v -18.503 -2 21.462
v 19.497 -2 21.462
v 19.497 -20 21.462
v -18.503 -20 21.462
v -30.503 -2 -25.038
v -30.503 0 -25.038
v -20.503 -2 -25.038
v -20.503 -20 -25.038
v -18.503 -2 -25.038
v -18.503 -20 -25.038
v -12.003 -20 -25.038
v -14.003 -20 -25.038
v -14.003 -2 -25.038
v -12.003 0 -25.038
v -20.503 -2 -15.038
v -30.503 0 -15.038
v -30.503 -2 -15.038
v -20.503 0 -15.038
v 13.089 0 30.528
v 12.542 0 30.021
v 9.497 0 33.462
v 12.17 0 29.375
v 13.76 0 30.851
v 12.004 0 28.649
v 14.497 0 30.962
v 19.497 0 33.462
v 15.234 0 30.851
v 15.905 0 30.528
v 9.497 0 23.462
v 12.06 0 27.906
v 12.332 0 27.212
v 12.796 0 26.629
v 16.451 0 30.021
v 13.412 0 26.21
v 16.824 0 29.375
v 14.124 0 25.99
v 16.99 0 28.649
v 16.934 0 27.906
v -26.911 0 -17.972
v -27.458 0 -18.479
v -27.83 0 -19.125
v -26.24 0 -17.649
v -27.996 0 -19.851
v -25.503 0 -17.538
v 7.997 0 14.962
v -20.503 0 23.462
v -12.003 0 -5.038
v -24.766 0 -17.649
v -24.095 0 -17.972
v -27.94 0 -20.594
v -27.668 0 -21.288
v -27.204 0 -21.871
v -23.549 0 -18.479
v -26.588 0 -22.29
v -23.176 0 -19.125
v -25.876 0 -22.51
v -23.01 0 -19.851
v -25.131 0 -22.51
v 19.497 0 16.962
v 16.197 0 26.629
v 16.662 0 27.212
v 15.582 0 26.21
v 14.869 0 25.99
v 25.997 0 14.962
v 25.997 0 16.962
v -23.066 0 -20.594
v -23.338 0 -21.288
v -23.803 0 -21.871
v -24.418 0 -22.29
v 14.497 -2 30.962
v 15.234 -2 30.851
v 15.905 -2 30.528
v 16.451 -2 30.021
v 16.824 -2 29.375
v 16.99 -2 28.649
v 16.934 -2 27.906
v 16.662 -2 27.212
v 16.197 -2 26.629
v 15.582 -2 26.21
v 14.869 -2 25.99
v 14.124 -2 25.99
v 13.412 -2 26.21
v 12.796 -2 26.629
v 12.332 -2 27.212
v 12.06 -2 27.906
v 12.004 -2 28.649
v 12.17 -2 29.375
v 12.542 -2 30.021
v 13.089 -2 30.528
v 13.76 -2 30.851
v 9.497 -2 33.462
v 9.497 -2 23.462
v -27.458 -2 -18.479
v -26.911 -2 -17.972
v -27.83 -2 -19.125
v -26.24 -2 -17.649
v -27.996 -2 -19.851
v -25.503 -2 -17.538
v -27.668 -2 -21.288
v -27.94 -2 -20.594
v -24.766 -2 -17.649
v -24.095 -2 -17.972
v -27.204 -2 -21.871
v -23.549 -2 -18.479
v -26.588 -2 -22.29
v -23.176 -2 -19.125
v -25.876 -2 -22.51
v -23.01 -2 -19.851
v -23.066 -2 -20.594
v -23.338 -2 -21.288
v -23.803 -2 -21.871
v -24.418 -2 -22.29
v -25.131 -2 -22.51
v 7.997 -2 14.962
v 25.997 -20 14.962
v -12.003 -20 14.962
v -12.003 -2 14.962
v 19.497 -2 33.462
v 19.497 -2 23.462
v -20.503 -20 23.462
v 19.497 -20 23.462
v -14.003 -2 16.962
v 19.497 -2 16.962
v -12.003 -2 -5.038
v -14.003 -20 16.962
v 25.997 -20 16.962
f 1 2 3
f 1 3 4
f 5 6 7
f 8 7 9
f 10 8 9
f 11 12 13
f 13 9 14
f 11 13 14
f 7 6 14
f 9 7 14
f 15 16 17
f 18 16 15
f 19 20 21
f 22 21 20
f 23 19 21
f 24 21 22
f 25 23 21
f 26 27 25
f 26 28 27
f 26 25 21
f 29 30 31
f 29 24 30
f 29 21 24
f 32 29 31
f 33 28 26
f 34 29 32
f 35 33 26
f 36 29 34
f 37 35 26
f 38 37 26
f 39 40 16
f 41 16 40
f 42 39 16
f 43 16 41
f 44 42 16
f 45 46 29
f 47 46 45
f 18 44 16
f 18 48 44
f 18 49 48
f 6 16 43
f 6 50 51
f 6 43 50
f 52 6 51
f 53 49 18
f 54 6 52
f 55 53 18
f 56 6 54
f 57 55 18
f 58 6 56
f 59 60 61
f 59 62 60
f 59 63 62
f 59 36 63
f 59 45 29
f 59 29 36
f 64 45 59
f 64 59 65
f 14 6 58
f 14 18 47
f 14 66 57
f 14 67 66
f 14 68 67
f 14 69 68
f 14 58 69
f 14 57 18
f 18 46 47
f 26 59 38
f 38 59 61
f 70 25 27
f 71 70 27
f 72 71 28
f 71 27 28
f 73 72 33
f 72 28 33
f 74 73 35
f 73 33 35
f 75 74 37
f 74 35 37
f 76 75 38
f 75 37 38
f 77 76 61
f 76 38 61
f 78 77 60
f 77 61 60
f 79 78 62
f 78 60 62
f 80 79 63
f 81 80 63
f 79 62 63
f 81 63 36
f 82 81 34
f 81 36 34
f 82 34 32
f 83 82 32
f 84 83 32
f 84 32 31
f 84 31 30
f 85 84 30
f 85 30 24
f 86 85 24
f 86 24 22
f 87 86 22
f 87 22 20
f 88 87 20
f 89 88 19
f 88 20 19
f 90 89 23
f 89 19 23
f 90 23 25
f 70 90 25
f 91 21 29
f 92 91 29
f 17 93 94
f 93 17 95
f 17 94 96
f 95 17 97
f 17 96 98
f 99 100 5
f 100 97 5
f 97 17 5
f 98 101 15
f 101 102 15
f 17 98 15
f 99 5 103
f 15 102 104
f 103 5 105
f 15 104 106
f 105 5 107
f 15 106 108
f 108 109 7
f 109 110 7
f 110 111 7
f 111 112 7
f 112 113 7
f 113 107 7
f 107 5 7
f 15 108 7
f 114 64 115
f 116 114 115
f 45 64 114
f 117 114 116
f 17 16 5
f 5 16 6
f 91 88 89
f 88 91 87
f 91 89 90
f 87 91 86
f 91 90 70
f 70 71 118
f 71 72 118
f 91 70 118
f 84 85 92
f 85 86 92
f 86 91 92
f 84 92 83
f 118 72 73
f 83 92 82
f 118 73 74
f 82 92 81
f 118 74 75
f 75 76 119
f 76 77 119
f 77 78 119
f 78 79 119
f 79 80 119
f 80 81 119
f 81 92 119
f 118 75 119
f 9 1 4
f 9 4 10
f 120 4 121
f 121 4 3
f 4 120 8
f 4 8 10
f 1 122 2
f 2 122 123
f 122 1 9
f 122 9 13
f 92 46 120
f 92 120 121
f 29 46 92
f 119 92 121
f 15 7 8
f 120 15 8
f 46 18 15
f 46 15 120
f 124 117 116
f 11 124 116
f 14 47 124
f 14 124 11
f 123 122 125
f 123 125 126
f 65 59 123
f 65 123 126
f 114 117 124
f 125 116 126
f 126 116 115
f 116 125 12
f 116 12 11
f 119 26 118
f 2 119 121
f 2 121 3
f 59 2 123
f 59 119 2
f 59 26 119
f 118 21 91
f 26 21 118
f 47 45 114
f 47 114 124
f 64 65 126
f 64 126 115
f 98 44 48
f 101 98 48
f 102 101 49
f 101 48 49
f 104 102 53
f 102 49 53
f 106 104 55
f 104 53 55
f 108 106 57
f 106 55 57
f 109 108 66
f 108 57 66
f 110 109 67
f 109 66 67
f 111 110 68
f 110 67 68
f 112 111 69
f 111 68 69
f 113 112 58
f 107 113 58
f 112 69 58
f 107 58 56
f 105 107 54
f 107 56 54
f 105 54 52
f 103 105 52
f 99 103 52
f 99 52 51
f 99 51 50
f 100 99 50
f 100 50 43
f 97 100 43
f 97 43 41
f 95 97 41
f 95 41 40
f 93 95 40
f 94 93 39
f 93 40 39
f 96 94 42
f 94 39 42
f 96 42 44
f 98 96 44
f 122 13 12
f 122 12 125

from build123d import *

# Parameters (mm, degrees)
WALLS_DEPTH         = 20
WALLS_2_DEPTH       = 20
REST_ON_THIS_DEPTH  = 2
SKETCH2_W           = 10
SKETCH2_H           = 10
SKETCH2_R           = 2.5
BOSS_EXTRUDE3_DEPTH = 2


with BuildPart() as part:
    # Sketch1 → Walls (new body)
    with BuildSketch(Plane(origin=(0, 0, 0), x_dir=(1, 0, 0), z_dir=(0, 1, 0))):
        Polygon((-18.503168436, 25.037980983), (-20.503168436, 25.037980983), (-20.503168436, -23.462019017), (19.496831564, -23.462019017), (19.496831564, -21.462019017), (-18.503168436, -21.462019017), align=None)
    extrude(amount=-WALLS_DEPTH)



with BuildPart() as body_2:
    # Sketch1 → Walls 2 (new body)
    with BuildSketch(Plane(origin=(0, 0, 0), x_dir=(1, 0, 0), z_dir=(0, 1, 0))):
        Polygon((-12.003168436, 25.037980983), (-14.003168436, 25.037980983), (-14.003168436, -16.962019017), (25.996831564, -16.962019017), (25.996831564, -14.962019017), (-12.003168436, -14.962019017), align=None)
    extrude(amount=-WALLS_2_DEPTH)


with BuildPart() as part_1:
    add(part.part)

    add(body_2.part)  # Rest on this merges body 2
    # Sketch1<3> → Rest on this (add)
    with BuildSketch(Plane(origin=(0, 0, 0), x_dir=(1, 0, 0), z_dir=(0, 1, 0))):
        Polygon((-14.003168436, 25.037980983), (-18.503168436, 25.037980983), (-18.503168436, -21.462019017), (19.496831564, -21.462019017), (19.496831564, -16.962019017), (-14.003168436, -16.962019017), align=None)
    extrude(amount=-REST_ON_THIS_DEPTH)

    # Sketch2 → Boss-Extrude3 (add)
    # profile 1 of 3: a face of its own
    with BuildSketch(Plane(origin=(0, 0, 0), x_dir=(1, 0, 0), z_dir=(0, 1, 0))):
        Polygon((7.996831564, -14.962019017), (-12.003168436, 5.037980983), (-12.003168436, -14.962019017), align=None)
    # profile 2 of 3: a face of its own
    with BuildSketch(Plane(origin=(0, 0, 0), x_dir=(1, 0, 0), z_dir=(0, 1, 0))):
        with Locations((14.496831564, -28.462019017)):
            Rectangle(SKETCH2_W, SKETCH2_H)
        with Locations((14.496831564, -28.462019017)):
            Circle(SKETCH2_R, mode=Mode.SUBTRACT)
    # profile 3 of 3: a face of its own
    with BuildSketch(Plane(origin=(0, 0, 0), x_dir=(1, 0, 0), z_dir=(0, 1, 0))):
        with Locations((-25.503168436, 20.037980983)):
            Rectangle(SKETCH2_W, SKETCH2_H)
        with Locations((-25.503168436, 20.037980983)):
            Circle(SKETCH2_R, mode=Mode.SUBTRACT)
    extrude(amount=-BOSS_EXTRUDE3_DEPTH)


solid = part_1.part
